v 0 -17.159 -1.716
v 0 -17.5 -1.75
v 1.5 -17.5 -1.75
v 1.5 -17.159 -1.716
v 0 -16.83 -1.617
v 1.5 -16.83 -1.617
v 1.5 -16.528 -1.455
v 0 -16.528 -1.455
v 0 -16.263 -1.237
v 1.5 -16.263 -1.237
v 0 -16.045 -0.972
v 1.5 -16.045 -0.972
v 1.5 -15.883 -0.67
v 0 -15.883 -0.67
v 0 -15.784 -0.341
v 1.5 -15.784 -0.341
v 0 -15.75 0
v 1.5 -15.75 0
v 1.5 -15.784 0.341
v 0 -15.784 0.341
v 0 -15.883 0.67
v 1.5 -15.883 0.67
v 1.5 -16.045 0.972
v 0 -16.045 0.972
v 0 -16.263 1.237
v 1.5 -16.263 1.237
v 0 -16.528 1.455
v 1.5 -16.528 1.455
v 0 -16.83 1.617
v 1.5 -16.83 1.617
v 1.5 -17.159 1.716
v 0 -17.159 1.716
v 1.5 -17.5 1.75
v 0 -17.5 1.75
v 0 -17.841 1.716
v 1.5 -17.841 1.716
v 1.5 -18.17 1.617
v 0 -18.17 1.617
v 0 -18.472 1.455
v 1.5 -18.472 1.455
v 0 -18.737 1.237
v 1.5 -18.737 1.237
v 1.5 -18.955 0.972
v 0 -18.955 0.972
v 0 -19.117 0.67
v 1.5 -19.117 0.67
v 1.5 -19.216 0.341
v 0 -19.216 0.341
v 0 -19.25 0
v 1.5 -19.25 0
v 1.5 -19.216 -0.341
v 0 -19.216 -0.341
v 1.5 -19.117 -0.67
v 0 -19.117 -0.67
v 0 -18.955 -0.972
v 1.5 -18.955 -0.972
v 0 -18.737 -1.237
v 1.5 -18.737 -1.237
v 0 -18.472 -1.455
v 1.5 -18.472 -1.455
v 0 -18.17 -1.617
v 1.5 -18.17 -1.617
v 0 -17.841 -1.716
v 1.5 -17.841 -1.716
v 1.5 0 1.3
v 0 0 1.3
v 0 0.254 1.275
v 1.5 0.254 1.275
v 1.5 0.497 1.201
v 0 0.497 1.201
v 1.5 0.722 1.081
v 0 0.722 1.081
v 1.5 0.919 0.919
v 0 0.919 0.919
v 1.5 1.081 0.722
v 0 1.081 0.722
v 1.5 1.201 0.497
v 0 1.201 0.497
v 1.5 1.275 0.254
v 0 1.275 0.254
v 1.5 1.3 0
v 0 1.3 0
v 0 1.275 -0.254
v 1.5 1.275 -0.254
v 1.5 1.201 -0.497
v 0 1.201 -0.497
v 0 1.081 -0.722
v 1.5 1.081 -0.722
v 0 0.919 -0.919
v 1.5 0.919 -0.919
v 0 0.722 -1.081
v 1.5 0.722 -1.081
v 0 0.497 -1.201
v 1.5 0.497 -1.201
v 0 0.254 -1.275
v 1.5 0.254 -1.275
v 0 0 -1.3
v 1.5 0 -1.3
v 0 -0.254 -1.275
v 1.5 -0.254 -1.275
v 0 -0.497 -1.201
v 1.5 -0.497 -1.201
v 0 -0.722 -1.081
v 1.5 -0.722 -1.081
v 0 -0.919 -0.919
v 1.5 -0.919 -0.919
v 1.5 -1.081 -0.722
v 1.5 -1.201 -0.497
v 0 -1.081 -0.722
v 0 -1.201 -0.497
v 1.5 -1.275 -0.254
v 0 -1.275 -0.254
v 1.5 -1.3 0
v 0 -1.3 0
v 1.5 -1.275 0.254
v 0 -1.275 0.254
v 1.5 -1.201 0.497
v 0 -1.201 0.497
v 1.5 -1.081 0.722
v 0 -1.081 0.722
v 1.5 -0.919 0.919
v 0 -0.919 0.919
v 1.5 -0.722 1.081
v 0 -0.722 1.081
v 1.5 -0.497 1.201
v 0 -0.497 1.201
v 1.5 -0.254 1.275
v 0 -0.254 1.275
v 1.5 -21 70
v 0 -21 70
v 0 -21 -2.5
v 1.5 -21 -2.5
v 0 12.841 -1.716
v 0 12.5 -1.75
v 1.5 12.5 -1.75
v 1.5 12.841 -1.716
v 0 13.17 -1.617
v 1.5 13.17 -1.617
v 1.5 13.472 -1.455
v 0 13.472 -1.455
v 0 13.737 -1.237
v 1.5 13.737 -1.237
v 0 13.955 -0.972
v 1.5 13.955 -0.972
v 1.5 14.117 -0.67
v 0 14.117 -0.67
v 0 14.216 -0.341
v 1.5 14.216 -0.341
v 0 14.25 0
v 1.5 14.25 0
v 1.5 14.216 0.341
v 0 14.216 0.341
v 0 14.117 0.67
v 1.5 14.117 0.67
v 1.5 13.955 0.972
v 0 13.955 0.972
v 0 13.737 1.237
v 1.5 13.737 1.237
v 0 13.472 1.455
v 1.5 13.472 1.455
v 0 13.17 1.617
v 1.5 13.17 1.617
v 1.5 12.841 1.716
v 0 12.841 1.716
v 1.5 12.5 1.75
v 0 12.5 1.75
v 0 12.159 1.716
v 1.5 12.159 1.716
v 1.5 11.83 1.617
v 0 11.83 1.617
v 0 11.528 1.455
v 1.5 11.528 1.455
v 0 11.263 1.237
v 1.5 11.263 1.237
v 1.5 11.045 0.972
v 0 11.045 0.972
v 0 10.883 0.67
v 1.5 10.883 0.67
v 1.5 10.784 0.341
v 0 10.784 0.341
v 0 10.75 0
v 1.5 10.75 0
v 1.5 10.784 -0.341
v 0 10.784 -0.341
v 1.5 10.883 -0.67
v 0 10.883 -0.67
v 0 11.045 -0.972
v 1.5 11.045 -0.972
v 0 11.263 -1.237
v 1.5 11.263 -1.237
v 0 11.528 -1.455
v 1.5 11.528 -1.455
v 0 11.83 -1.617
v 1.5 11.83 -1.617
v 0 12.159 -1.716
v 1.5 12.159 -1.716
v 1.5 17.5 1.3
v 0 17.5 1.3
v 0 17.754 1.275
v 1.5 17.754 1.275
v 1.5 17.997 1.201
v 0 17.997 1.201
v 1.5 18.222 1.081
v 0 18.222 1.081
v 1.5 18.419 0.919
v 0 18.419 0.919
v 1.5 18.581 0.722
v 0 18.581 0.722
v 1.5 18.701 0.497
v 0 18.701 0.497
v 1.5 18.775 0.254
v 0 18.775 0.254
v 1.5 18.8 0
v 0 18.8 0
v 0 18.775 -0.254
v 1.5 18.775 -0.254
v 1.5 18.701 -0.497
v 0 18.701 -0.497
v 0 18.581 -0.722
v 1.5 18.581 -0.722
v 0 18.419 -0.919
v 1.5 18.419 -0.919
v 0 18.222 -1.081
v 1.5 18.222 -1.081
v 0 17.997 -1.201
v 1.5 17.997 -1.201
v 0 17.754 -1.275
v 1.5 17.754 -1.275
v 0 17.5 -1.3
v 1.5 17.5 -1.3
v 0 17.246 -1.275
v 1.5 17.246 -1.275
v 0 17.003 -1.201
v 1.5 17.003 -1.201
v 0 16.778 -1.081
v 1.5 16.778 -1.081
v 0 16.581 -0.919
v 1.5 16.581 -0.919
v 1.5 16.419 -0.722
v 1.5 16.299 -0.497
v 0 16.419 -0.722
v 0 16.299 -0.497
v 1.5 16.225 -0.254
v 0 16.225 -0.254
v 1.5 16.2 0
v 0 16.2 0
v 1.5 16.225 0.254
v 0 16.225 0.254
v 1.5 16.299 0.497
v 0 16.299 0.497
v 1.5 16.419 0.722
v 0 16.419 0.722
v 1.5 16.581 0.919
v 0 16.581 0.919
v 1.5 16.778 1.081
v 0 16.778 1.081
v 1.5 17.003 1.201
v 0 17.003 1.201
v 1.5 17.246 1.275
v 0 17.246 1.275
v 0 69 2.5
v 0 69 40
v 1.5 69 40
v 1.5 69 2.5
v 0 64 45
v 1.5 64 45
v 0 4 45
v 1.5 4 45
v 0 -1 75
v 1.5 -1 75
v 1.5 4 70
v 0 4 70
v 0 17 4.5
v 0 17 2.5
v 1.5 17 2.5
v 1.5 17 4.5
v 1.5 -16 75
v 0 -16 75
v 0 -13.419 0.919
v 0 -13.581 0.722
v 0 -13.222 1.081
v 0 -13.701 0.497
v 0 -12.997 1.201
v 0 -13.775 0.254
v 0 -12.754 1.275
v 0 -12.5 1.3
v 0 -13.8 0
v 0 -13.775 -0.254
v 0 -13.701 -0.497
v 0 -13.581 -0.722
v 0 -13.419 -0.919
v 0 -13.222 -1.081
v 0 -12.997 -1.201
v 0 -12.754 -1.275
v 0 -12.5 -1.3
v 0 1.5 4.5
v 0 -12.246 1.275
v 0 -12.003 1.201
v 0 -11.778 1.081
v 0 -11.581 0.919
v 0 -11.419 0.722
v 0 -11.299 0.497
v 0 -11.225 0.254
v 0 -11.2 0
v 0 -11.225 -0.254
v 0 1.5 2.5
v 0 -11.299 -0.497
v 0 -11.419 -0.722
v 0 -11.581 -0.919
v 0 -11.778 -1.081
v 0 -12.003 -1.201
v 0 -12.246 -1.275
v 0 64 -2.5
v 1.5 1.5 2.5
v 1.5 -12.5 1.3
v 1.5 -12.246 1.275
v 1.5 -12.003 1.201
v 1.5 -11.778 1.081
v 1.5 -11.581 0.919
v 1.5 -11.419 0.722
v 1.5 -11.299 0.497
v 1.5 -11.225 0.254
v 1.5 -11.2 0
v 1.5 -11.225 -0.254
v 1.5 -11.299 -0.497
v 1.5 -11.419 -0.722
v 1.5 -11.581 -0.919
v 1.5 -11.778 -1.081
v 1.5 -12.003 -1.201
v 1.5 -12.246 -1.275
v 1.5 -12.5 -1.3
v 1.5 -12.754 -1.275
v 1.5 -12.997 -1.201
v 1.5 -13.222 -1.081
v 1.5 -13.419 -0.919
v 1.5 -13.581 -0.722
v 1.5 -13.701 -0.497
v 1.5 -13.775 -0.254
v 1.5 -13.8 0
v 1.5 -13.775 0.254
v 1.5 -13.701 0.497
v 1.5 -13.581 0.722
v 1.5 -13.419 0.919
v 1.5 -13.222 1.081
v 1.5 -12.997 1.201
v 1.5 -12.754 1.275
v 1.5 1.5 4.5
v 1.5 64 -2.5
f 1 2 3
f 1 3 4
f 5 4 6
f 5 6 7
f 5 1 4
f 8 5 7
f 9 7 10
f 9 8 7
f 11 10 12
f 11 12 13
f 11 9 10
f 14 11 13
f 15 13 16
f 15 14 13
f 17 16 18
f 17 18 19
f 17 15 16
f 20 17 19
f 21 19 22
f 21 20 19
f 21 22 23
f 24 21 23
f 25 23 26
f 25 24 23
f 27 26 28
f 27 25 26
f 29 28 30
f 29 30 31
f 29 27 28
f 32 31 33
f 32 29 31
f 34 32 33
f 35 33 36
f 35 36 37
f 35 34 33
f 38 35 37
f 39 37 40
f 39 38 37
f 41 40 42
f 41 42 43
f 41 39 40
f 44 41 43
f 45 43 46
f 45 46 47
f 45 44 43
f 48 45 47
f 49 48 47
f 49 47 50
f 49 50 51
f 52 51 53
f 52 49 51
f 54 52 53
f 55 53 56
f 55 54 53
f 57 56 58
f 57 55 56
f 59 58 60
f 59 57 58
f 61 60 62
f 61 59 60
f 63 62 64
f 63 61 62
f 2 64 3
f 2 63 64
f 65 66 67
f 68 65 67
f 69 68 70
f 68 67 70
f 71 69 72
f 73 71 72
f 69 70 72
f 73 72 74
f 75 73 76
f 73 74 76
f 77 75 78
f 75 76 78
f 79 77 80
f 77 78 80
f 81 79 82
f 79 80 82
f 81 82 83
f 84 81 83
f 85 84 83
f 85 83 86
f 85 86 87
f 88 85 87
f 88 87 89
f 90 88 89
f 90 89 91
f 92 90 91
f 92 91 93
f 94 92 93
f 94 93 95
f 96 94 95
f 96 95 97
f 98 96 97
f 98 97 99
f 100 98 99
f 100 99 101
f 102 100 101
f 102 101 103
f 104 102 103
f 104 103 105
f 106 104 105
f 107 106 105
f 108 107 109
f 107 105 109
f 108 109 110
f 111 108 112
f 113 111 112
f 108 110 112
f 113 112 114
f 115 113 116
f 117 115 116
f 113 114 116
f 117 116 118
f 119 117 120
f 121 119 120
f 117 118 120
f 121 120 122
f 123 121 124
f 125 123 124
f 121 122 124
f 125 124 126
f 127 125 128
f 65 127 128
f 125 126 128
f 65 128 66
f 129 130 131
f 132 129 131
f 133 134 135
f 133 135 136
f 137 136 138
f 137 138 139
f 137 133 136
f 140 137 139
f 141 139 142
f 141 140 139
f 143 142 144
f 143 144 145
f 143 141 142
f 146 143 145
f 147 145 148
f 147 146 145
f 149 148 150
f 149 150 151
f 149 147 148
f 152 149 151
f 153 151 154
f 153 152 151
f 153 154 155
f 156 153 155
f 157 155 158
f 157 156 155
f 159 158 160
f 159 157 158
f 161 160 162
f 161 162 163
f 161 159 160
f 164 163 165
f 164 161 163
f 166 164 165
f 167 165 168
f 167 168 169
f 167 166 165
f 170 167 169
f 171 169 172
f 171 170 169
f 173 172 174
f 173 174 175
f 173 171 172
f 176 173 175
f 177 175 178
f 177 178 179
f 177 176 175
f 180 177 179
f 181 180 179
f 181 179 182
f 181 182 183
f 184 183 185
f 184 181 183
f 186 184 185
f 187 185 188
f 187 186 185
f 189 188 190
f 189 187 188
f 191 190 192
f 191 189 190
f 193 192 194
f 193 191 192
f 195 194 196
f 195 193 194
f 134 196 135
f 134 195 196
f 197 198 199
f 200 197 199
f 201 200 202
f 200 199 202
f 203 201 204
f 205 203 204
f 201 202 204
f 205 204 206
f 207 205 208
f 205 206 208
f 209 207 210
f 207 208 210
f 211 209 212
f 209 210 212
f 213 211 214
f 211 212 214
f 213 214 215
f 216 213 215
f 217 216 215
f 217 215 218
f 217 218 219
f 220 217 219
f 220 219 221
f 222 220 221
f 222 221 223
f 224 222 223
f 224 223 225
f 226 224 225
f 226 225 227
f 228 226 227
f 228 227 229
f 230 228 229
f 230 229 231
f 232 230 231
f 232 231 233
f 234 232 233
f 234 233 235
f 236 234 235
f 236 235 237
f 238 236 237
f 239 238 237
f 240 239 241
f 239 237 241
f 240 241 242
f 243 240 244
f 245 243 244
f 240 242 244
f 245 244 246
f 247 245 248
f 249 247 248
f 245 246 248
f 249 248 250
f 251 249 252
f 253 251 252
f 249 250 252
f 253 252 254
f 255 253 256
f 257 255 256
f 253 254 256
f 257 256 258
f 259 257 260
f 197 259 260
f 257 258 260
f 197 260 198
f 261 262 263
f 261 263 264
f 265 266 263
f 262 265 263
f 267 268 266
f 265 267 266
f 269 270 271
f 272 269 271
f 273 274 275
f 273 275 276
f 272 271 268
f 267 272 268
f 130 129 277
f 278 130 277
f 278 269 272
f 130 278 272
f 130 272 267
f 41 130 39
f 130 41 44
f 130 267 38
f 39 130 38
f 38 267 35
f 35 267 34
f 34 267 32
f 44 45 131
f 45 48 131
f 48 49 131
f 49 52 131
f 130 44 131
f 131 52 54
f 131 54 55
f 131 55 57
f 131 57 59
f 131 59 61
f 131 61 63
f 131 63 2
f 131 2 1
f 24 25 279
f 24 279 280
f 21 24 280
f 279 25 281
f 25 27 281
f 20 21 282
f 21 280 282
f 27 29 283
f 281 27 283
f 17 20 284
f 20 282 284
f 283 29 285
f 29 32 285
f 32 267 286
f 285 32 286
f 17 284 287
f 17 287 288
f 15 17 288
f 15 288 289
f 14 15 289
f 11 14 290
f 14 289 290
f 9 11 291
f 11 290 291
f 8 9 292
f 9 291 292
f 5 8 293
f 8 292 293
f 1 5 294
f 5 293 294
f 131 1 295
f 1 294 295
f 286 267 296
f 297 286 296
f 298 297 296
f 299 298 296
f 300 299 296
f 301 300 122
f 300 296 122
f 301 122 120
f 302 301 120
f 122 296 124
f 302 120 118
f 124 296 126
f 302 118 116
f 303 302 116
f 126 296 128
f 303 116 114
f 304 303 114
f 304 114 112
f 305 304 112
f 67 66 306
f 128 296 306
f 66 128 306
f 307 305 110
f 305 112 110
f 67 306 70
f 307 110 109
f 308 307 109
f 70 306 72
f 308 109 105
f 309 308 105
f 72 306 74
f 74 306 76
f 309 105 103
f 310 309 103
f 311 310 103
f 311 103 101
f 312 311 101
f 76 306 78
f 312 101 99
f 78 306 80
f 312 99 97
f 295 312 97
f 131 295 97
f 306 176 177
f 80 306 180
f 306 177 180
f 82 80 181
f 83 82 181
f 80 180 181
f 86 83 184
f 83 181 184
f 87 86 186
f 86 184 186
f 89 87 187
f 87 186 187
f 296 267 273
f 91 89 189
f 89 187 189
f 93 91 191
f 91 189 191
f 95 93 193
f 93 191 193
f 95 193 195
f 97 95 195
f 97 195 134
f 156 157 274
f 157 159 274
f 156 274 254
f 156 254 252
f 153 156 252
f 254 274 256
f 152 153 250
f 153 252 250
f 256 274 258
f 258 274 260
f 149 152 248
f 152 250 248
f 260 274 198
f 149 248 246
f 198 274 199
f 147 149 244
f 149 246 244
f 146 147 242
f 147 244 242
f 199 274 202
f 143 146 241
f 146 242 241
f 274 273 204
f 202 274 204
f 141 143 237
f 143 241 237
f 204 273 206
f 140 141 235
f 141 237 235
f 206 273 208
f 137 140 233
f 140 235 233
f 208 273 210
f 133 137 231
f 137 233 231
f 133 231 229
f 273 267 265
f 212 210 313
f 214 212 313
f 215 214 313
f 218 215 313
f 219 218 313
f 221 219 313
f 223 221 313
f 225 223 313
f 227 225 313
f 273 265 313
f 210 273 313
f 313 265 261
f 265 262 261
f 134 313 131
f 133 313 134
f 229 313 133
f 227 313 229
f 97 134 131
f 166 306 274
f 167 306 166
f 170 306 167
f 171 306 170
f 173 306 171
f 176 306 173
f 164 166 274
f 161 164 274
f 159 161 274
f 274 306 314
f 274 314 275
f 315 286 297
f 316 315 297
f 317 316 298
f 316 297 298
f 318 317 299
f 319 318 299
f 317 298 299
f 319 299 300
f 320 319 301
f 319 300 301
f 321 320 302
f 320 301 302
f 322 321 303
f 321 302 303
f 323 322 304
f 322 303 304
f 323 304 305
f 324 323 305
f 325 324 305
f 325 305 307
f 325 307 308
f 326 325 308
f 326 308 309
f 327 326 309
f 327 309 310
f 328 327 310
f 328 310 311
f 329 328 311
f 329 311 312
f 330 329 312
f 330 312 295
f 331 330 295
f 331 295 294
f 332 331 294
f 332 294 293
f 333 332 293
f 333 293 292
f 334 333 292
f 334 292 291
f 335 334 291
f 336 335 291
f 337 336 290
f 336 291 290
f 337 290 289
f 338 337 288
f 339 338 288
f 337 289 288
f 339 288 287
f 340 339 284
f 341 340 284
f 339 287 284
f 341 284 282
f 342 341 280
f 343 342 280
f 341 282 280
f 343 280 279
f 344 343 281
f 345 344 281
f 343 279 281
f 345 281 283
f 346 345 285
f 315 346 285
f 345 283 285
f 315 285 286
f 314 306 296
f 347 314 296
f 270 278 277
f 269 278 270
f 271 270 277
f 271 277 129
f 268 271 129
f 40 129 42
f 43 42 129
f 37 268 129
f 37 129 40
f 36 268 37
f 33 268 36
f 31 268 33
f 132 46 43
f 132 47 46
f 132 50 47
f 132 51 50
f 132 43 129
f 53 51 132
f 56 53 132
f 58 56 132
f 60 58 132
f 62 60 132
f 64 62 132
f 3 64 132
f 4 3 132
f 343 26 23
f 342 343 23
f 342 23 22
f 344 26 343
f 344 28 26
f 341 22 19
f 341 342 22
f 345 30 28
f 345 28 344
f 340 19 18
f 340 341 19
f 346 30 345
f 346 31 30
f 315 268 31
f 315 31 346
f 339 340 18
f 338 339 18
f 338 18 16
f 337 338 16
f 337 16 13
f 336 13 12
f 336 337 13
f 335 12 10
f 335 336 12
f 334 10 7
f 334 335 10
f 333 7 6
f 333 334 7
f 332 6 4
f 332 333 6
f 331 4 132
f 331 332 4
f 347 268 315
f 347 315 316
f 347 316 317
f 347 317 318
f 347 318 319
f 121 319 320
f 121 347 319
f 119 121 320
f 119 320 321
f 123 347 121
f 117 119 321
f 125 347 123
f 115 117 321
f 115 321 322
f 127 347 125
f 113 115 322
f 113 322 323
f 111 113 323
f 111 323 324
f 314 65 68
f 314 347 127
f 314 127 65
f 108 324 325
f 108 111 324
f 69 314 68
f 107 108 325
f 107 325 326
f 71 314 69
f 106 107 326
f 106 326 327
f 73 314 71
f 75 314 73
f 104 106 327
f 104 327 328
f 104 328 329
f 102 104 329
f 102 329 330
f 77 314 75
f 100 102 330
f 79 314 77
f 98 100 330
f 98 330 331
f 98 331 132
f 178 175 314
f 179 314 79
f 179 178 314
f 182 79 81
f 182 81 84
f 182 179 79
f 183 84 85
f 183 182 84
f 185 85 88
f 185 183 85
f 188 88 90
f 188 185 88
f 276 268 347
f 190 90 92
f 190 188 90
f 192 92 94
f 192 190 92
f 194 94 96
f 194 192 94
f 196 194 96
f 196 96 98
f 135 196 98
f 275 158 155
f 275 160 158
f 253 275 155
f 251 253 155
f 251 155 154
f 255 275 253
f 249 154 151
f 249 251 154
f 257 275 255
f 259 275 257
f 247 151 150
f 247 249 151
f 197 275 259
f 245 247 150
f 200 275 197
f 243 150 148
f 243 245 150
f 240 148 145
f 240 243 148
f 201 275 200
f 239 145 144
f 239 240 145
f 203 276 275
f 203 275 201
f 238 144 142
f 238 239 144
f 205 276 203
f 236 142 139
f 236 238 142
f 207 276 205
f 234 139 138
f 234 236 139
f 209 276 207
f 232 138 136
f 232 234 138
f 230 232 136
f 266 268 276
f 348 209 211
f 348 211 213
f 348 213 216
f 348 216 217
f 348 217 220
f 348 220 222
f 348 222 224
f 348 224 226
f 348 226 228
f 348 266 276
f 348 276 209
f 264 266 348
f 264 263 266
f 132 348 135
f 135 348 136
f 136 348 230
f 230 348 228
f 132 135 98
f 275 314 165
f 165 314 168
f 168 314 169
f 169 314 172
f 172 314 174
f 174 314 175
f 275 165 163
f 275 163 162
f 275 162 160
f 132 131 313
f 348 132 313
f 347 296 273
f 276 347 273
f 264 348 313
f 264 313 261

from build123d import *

# Parameters (mm, degrees)
ESQUISSE1_W                            = 77.5
ESQUISSE1_H                            = 90
ESQUISSE1_R                            = 1.75
EXTRUSION1_DEPTH                       = 1.5
FRAISAGE_POUR_VIS_T_TE_FRAIS_E_M2_51_D = 2.59999988
ESQUISSE5_W                            = 2
ESQUISSE5_H                            = 15.5
ENL_V_MAT_EXTRU_1_DEPTH                = 102.922764876
ENL_V_MAT_EXTRU_2_REACH                = 103.923


with BuildPart() as part:
    # Esquisse1 → Extrusion1 (new body)
    with BuildSketch(Plane(origin=(0, 0, 0), x_dir=(0, 0, -1), z_dir=(1, 0, 0))):
        with Locations((-36.25, 24)):
            Rectangle(ESQUISSE1_W, ESQUISSE1_H)
        with Locations((0, -17.5)):
            Circle(ESQUISSE1_R, mode=Mode.SUBTRACT)
        with Locations((0, 12.5)):
            Circle(ESQUISSE1_R, mode=Mode.SUBTRACT)
    extrude(amount=EXTRUSION1_DEPTH)

    # Fraisage pour vis à tête fraisée M2.51 (through all)
    with Locations(Plane(origin=(1.5, 0, 0), x_dir=(0, 0, -1), z_dir=(1, 0, 0))):
        with Locations((0, 17.5), (0, -12.5), (0, 0)):
            Hole(FRAISAGE_POUR_VIS_T_TE_FRAIS_E_M2_51_D / 2)

    # Esquisse5 → Enlèv. mat.-Extru.1 (cut, through all)
    with BuildSketch(Plane.ZY):
        with Locations((3.5, 9.25)):
            Rectangle(ESQUISSE5_W, ESQUISSE5_H)
    extrude(amount=-ENL_V_MAT_EXTRU_1_DEPTH, mode=Mode.SUBTRACT)

    # Esquisse6 → Enlèv. mat.-Extru.2 (cut, up to next)
    with BuildSketch(Plane(origin=(1.5, 0, 0), x_dir=(0, 0, -1), z_dir=(1, 0, 0)), mode=Mode.PRIVATE) as enl_v_mat_extru_2_sk1:
        Polygon((-75, 69), (-75, -1), (-70, 4), (-45, 4), (-45, 64), (-40, 69), align=None)
    enl_v_mat_extru_2_tool1 = extrude(enl_v_mat_extru_2_sk1.sketch, amount=-ENL_V_MAT_EXTRU_2_REACH, mode=Mode.PRIVATE) & part.part
    # Esquisse6 → Enlèv. mat.-Extru.2 (cut, up to next)
    with BuildSketch(Plane(origin=(1.5, 0, 0), x_dir=(0, 0, -1), z_dir=(1, 0, 0)), mode=Mode.PRIVATE) as enl_v_mat_extru_2_sk2:
        Polygon((-75, -21), (-70, -21), (-75, -16), align=None)
    enl_v_mat_extru_2_tool2 = extrude(enl_v_mat_extru_2_sk2.sketch, amount=-ENL_V_MAT_EXTRU_2_REACH, mode=Mode.PRIVATE) & part.part
    # Esquisse6 → Enlèv. mat.-Extru.2 (cut, up to next)
    with BuildSketch(Plane(origin=(1.5, 0, 0), x_dir=(0, 0, -1), z_dir=(1, 0, 0)), mode=Mode.PRIVATE) as enl_v_mat_extru_2_sk3:
        Polygon((2.5, 69), (2.5, 64), (-2.5, 69), align=None)
    enl_v_mat_extru_2_tool3 = extrude(enl_v_mat_extru_2_sk3.sketch, amount=-ENL_V_MAT_EXTRU_2_REACH, mode=Mode.PRIVATE) & part.part
    add(enl_v_mat_extru_2_tool1.solids().sort_by_distance((1.5, 36.478903, 59.978903))[0], mode=Mode.SUBTRACT)
    add(enl_v_mat_extru_2_tool2.solids().sort_by_distance((1.5, -19.333333, 73.333333))[0], mode=Mode.SUBTRACT)
    add(enl_v_mat_extru_2_tool3.solids().sort_by_distance((1.5, 67.333333, -0.833333))[0], mode=Mode.SUBTRACT)


solid = part.part
